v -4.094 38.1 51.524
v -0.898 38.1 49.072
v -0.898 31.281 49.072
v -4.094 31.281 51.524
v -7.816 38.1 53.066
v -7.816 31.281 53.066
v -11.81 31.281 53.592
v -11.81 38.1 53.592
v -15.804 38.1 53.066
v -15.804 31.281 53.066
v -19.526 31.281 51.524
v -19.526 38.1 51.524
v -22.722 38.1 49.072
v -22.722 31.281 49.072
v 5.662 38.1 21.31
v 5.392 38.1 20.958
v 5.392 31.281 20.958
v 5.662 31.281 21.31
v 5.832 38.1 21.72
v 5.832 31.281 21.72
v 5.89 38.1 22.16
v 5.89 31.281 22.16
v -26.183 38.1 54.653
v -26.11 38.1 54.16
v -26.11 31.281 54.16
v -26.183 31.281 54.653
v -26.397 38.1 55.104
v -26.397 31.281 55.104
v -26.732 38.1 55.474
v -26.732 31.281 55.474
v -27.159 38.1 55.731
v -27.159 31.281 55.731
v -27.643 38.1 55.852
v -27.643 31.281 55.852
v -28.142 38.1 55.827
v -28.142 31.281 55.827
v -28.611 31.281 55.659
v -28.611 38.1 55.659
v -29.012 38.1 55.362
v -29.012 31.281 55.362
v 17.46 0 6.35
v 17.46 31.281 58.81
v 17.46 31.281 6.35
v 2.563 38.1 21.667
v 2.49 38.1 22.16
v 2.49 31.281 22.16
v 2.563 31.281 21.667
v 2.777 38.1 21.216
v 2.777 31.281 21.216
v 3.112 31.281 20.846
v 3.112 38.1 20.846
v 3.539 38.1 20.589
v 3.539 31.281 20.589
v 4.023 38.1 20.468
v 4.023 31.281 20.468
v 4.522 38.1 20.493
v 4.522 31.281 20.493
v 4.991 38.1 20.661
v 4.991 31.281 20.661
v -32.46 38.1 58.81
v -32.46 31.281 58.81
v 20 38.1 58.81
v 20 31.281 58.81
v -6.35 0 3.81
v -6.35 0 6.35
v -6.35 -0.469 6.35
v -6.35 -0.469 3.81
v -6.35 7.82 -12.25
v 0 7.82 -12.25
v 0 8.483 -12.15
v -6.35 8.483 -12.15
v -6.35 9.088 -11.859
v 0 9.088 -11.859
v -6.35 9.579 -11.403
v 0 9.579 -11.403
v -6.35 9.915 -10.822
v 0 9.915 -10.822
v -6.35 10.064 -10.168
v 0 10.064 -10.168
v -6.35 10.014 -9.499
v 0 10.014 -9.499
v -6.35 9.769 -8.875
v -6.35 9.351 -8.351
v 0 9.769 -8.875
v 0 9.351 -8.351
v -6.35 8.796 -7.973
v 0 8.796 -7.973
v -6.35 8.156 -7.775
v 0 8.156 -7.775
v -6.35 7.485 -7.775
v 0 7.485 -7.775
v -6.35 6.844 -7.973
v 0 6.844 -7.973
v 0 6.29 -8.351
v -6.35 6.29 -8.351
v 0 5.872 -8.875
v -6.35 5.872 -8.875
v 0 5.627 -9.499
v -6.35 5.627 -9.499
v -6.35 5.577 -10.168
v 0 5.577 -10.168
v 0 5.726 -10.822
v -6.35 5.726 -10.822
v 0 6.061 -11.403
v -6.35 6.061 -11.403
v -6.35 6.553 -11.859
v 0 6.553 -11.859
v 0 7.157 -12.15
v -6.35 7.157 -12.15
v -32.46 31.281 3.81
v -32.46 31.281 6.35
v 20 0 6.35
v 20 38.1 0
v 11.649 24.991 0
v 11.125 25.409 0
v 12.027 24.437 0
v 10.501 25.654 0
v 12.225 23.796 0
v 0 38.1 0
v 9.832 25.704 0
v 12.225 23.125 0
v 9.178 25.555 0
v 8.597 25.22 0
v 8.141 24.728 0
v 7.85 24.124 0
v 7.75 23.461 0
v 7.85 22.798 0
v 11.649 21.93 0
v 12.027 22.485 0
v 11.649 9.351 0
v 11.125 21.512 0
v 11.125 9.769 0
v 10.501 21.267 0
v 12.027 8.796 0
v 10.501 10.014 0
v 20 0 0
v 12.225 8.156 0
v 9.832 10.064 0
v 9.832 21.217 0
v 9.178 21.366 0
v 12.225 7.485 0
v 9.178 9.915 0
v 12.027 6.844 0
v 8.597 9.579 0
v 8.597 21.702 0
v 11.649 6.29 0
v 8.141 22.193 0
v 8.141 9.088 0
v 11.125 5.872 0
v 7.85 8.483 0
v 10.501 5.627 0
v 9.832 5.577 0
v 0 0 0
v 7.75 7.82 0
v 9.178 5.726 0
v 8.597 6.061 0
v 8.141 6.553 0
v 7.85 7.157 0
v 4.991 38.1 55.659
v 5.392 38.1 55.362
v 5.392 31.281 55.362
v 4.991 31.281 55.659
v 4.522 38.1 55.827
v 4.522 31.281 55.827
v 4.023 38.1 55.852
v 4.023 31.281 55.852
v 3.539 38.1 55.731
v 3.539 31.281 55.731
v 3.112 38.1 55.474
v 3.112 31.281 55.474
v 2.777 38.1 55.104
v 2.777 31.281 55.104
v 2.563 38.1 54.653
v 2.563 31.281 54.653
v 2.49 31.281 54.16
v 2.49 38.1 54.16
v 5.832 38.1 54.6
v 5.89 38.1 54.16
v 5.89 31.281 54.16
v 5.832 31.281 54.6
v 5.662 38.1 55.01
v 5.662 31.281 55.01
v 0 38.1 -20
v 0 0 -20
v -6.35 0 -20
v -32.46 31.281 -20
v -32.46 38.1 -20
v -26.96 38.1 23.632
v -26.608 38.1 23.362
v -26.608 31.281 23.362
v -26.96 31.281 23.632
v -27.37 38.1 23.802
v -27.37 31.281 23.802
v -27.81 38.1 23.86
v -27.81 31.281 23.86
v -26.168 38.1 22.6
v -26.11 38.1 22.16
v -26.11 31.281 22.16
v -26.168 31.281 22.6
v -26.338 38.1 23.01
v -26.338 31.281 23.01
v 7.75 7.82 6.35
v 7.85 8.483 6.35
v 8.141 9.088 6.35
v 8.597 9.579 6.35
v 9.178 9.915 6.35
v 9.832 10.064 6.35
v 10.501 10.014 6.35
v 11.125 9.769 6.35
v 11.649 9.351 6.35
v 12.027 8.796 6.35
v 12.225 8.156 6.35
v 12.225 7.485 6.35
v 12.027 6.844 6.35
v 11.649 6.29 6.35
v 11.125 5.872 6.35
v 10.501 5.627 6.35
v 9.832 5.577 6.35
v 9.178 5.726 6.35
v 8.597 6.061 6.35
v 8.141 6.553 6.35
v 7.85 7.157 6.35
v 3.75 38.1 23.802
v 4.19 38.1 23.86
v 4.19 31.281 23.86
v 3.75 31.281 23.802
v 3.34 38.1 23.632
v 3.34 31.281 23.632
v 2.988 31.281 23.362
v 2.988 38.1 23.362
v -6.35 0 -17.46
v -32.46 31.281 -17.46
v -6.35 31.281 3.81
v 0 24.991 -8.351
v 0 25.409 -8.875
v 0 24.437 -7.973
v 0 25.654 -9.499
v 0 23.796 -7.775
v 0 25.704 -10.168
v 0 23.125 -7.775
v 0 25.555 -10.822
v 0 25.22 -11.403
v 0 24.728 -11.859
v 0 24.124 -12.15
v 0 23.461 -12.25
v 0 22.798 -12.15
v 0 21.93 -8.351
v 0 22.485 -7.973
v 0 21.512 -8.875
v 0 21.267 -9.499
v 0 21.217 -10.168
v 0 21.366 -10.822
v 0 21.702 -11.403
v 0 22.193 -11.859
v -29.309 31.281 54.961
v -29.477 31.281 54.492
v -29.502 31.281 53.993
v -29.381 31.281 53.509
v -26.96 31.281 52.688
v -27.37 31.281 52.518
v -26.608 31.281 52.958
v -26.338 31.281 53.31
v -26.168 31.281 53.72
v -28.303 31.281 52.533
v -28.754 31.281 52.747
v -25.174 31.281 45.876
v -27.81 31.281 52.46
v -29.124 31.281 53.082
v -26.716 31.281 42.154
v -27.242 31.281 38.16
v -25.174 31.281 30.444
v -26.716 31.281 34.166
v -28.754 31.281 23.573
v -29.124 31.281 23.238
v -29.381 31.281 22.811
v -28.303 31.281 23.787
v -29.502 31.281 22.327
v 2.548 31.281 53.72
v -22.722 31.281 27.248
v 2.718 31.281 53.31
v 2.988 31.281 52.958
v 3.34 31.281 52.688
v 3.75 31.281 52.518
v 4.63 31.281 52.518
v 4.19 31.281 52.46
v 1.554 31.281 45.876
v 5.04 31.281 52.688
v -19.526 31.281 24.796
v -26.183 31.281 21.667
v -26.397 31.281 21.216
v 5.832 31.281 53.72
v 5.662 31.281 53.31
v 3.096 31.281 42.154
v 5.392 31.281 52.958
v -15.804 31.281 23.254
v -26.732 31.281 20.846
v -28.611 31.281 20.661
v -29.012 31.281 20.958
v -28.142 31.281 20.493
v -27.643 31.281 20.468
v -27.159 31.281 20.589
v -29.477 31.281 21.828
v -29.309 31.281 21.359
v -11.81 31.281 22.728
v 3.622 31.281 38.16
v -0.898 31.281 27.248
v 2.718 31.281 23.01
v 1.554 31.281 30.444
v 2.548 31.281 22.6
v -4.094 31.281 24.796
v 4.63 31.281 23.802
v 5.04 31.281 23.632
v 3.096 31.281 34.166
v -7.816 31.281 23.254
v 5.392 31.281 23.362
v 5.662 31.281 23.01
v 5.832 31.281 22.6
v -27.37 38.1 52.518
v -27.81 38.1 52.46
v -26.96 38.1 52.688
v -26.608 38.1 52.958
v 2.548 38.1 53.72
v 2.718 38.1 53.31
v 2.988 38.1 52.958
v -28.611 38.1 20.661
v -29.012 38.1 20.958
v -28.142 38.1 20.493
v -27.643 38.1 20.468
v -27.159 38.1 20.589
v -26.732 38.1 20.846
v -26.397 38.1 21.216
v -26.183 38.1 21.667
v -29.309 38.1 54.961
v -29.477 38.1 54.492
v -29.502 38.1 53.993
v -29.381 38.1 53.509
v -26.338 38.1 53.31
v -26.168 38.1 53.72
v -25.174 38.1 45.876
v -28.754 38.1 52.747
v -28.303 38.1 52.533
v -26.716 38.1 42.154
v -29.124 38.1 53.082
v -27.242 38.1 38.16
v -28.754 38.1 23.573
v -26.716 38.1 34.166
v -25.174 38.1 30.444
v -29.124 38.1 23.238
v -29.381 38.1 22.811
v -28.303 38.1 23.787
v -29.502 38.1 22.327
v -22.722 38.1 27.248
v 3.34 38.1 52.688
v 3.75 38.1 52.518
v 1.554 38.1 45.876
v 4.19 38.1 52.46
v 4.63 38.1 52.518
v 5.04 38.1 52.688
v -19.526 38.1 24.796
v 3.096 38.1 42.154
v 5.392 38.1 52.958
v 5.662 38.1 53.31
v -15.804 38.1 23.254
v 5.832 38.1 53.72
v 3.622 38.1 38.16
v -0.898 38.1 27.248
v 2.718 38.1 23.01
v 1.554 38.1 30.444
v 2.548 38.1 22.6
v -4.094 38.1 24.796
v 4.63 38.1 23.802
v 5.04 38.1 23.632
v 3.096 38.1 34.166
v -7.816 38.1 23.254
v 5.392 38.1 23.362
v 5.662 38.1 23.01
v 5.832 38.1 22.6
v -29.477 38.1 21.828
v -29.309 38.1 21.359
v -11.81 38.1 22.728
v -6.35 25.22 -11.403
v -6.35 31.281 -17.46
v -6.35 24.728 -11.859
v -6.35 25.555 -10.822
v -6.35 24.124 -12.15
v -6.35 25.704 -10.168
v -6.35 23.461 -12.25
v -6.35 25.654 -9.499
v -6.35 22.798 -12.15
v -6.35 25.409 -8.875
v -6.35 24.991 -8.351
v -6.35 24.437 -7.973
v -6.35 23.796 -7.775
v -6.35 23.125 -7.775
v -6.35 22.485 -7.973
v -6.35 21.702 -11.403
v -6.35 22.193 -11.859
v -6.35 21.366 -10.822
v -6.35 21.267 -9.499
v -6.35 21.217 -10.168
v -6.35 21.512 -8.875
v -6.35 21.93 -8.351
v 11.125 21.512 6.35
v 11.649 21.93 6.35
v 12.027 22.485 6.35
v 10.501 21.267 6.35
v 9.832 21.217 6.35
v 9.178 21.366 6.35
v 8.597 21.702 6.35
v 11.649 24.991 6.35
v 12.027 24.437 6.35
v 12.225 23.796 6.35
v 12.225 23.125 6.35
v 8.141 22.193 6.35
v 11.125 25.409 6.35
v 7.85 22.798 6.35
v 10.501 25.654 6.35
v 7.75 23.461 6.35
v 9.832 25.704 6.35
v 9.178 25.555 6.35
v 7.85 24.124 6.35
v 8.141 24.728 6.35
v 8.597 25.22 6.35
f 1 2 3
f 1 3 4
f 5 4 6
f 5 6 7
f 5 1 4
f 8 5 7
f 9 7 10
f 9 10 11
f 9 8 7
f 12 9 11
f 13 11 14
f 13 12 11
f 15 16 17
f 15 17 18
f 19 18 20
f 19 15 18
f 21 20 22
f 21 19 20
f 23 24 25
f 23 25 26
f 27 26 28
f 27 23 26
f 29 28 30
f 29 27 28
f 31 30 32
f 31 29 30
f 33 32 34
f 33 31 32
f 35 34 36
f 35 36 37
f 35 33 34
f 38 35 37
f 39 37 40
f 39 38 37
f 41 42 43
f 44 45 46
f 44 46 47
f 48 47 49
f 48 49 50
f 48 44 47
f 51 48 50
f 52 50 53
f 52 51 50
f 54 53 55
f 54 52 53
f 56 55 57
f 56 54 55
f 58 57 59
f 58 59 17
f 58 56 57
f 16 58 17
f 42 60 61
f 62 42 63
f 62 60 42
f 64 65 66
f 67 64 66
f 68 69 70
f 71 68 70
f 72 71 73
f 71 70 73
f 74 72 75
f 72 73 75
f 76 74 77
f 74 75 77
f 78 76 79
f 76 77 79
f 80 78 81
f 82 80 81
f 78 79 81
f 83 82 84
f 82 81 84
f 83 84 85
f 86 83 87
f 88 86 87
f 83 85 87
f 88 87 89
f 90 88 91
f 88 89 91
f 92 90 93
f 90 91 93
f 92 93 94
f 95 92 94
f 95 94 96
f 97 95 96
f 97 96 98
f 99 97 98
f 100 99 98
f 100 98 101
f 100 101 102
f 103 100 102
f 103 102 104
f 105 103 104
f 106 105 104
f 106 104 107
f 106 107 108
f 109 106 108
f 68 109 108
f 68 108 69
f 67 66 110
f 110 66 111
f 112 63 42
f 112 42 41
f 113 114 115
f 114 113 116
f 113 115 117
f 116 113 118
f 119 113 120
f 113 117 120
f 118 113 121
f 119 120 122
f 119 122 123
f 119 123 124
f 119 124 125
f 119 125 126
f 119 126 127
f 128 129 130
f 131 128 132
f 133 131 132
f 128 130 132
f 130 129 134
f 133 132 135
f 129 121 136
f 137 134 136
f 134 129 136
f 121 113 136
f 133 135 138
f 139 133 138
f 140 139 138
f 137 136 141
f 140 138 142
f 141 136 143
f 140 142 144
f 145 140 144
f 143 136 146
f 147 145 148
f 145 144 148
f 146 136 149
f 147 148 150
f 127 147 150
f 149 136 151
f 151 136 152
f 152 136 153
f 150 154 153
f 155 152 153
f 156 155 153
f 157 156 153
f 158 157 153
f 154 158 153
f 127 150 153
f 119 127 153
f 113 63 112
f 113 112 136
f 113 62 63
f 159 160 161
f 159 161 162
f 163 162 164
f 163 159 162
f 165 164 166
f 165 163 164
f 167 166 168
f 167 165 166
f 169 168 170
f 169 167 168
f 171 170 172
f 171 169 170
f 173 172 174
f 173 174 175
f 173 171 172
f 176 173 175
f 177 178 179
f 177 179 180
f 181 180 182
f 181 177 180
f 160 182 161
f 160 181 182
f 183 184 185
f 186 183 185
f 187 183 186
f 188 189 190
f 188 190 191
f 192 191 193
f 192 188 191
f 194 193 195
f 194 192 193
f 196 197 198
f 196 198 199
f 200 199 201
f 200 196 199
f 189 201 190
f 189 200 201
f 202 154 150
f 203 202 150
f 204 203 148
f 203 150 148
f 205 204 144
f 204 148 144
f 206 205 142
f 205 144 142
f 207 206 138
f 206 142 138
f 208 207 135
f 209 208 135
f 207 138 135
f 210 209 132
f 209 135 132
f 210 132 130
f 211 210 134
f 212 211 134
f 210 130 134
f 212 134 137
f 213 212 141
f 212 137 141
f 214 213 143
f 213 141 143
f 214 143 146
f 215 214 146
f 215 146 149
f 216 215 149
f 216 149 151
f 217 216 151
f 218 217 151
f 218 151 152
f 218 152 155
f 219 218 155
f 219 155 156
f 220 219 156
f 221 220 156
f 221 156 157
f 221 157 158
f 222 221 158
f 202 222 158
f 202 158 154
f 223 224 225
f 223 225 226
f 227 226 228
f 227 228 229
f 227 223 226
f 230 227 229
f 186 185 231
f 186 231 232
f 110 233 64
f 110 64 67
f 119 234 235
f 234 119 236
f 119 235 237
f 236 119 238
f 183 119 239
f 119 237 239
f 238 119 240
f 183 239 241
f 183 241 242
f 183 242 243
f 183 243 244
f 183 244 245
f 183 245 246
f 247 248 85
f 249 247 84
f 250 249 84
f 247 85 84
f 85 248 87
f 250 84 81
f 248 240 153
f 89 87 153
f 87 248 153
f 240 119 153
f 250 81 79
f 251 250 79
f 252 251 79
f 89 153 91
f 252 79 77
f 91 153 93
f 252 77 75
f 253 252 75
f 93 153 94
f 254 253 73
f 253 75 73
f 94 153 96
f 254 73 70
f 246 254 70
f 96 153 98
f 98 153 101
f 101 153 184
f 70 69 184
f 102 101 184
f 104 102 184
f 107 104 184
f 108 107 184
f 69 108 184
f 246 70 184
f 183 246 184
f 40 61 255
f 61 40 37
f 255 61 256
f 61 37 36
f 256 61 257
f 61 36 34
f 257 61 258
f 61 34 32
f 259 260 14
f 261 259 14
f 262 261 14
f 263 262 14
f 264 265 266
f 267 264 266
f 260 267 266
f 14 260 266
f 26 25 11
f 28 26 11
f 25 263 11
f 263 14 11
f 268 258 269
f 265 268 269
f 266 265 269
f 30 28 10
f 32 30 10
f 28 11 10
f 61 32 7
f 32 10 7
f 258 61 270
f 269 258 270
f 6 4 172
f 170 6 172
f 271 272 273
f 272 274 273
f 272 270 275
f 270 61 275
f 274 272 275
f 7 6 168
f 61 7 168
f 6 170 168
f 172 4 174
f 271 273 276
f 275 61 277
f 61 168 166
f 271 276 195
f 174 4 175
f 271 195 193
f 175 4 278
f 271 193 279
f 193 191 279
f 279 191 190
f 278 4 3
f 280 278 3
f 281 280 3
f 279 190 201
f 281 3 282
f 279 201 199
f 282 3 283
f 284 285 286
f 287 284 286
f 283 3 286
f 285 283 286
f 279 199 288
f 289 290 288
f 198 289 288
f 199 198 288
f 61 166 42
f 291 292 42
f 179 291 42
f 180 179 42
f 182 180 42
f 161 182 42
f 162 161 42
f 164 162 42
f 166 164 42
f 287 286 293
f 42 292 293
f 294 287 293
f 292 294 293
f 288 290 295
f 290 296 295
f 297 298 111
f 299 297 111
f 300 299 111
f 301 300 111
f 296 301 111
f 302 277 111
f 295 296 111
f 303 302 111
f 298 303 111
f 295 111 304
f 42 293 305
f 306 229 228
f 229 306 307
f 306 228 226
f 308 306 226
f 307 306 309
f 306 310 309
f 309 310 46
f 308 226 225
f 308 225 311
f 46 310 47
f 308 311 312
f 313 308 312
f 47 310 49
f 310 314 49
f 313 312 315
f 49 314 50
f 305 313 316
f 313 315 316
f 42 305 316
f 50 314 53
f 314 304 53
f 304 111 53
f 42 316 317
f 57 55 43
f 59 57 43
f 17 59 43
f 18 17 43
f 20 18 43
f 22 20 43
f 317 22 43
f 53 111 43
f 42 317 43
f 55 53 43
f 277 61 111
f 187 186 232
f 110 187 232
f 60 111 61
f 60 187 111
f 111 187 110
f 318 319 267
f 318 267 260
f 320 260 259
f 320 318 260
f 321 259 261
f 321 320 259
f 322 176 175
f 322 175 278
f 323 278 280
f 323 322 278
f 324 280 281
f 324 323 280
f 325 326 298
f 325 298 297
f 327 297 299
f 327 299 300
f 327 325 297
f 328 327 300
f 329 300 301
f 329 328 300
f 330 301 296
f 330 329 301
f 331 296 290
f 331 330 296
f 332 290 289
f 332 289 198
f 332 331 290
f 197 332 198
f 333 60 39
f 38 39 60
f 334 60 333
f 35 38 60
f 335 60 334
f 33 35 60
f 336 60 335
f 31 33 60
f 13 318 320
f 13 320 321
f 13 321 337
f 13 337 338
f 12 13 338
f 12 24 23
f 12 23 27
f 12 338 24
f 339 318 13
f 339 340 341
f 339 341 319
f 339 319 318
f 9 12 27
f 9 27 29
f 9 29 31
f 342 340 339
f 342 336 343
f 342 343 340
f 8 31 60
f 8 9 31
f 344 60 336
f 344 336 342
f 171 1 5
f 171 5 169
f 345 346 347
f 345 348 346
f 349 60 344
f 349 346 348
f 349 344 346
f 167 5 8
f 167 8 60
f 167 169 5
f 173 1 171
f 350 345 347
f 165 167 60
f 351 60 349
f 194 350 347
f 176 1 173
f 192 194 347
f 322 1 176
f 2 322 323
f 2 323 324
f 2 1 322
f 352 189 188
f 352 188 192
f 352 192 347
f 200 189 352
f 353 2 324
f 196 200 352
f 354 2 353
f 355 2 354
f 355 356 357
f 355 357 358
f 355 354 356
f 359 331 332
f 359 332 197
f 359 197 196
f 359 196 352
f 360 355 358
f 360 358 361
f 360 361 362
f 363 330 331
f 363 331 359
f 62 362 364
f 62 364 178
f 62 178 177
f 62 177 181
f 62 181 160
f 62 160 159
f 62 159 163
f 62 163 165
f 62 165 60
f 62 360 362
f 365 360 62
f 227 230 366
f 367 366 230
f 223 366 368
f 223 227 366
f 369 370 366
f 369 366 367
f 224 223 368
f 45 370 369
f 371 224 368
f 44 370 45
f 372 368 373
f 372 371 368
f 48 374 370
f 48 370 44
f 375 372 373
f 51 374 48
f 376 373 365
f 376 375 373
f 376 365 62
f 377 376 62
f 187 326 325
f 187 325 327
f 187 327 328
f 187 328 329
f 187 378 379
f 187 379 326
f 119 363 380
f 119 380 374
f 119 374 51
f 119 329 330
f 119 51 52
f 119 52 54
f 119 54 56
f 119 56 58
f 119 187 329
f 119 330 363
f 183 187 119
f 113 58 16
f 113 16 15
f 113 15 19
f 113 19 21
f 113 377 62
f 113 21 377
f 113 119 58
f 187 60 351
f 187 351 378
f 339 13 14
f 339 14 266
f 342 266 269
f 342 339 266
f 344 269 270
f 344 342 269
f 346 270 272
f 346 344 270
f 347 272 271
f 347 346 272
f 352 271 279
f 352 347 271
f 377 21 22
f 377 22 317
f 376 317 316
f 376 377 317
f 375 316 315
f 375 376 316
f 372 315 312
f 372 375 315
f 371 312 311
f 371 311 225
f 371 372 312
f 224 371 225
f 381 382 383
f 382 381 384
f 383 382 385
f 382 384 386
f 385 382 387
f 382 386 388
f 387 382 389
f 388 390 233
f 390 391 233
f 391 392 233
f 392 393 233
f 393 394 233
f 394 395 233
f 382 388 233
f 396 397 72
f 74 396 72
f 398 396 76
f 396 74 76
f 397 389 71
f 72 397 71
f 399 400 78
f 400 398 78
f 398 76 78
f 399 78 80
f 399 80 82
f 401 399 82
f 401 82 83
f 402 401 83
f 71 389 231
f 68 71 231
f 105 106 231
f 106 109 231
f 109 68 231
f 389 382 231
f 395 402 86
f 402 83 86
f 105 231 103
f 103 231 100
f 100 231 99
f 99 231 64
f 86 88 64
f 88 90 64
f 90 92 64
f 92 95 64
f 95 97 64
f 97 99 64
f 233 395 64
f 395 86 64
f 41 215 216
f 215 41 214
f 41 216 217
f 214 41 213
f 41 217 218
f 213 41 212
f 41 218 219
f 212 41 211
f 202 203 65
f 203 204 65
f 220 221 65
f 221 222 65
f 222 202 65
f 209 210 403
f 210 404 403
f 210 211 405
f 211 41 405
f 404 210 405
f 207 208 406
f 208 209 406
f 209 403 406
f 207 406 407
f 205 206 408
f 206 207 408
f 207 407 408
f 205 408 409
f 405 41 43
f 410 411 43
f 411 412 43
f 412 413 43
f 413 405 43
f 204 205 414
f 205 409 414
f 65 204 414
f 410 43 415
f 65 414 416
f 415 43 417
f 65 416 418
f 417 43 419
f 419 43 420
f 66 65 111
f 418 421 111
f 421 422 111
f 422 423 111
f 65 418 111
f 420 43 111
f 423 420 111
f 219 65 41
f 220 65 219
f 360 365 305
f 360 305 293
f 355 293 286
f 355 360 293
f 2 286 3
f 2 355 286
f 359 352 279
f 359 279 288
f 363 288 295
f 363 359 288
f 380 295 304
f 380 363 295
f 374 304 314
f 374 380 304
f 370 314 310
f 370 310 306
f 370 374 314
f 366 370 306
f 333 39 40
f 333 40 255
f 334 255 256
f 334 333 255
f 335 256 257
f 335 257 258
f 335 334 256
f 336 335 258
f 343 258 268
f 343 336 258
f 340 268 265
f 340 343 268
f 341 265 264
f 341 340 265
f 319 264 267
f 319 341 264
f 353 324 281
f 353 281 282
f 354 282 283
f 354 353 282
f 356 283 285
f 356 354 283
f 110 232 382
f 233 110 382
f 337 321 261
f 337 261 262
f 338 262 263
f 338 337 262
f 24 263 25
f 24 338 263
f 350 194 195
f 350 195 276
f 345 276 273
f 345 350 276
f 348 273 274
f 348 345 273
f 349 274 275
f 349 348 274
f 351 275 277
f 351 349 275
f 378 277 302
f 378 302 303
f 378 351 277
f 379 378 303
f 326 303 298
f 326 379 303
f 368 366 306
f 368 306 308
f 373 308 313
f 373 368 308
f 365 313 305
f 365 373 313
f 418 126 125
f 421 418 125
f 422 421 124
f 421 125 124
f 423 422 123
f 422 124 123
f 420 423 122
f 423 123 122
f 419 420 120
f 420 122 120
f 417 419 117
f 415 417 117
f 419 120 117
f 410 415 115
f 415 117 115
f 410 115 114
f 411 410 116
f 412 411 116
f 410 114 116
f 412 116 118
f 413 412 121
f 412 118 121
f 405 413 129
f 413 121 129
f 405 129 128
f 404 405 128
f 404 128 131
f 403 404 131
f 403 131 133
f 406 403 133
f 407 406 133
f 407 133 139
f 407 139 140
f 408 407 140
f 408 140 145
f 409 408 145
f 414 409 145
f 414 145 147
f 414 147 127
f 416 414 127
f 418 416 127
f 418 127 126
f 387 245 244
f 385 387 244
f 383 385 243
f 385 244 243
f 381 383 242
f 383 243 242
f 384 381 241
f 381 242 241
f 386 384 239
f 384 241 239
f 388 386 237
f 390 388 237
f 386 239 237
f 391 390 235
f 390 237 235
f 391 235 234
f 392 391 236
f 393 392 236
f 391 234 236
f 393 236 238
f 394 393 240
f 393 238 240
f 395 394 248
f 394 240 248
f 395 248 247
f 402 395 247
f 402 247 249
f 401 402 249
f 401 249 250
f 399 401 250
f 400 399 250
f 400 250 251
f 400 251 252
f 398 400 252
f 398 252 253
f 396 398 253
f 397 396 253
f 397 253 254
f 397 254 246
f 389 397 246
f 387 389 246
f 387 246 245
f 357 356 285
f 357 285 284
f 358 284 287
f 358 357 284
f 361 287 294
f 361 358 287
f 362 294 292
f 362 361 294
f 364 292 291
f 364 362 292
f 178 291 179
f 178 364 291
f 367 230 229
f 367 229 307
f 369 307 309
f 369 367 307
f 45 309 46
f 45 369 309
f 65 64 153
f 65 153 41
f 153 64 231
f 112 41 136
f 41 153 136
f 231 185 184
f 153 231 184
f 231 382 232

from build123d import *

# Parameters (mm, degrees)
SKETCH1_W            = 20
SKETCH1_H            = 6.35
SKETCH1_W_2          = 6.35
SKETCH1_H_2          = 20
BOSS_EXTRUDE1_DEPTH  = 38.1
SKETCH2_W            = 26.11
SKETCH2_H            = 26.35
BOSS_EXTRUDE2_DEPTH  = 6.81899017
BOSS_EXTRUDE3_DEPTH  = 2.54
BOSS_EXTRUDE4_DEPTH  = 2.54
BOSS_EXTRUDE5_DEPTH  = 2.54
M4_CLEARANCE_HOLE1_D = 4.5
M4_CLEARANCE_HOLE2_D = 4.5


with BuildPart() as part:
    # Sketch1 → Boss-Extrude1 (new body)
    with BuildSketch(Plane(origin=(0, 0, 0), x_dir=(1, 0, 0), z_dir=(0, 1, 0))):
        with Locations((10, -3.175)):
            Rectangle(SKETCH1_W, SKETCH1_H)
        with Locations((-3.175, -3.175)):
            Rectangle(SKETCH1_W_2, SKETCH1_H)
        with Locations((-3.175, 10)):
            Rectangle(SKETCH1_W_2, SKETCH1_H_2)
    extrude(amount=BOSS_EXTRUDE1_DEPTH)

    # Sketch2 → Boss-Extrude2 (add)
    with BuildSketch(Plane(origin=(0, 38.1, 0), x_dir=(1, 0, 0), z_dir=(0, 1, 0))):
        with BuildLine():
            Line((-32.46, -58.81), (8.84, -58.81))
            Line((8.84, -58.81), (5.392081528, -55.362081528))
            ThreePointArc((5.392081528, -55.362081528), (3.539438165, -55.730595205), (2.49, -54.16))
            Line((2.49, -54.16), (-26.11, -54.16))
            ThreePointArc((-26.11, -54.16), (-27.159438165, -55.730595205), (-29.012081528, -55.362081528))
            Line((-29.012081528, -55.362081528), (-32.46, -58.81))
        make_face()
        with BuildLine():
            Line((5.392081528, -55.362081528), (8.84, -58.81))
            Line((8.84, -58.81), (8.84, -17.51))
            Line((8.84, -17.51), (5.392081528, -20.957918472))
            ThreePointArc((5.392081528, -20.957918472), (5.760595205, -21.509438165), (5.89, -22.16))
            ThreePointArc((5.89, -22.16), (5.392081528, -23.362081528), (4.19, -23.86))
            Line((4.19, -23.86), (4.19, -52.46))
            ThreePointArc((4.19, -52.46), (5.392081528, -52.957918472), (5.89, -54.16))
            ThreePointArc((5.89, -54.16), (5.760595205, -54.810561835), (5.392081528, -55.362081528))
        make_face()
        Polygon((20, -58.81), (20, -6.35), (-6.35, -6.35), (-32.46, -6.35), (-32.46, -17.51), (8.84, -17.51), (8.84, -58.81), align=None)
        with Locations((-19.405, 6.825)):
            Rectangle(SKETCH2_W, SKETCH2_H)
        with BuildLine():
            Line((8.84, -17.51), (-32.46, -17.51))
            Line((-32.46, -17.51), (-29.012081528, -20.957918472))
            ThreePointArc((-29.012081528, -20.957918472), (-27.159438165, -20.589404795), (-26.11, -22.16))
            Line((-26.11, -22.16), (2.49, -22.16))
            ThreePointArc((2.49, -22.16), (3.539438165, -20.589404795), (5.392081528, -20.957918472))
            Line((5.392081528, -20.957918472), (8.84, -17.51))
        make_face()
        with BuildLine():
            Line((-29.012081528, -20.957918472), (-32.46, -17.51))
            Line((-32.46, -17.51), (-32.46, -58.81))
            Line((-32.46, -58.81), (-29.012081528, -55.362081528))
            ThreePointArc((-29.012081528, -55.362081528), (-29.380595205, -53.509438165), (-27.81, -52.46))
            Line((-27.81, -52.46), (-27.81, -23.86))
            ThreePointArc((-27.81, -23.86), (-29.380595205, -22.810561835), (-29.012081528, -20.957918472))
        make_face()
        with BuildLine():
            ThreePointArc((-26.607918472, -23.362081528), (-27.159438165, -23.730595205), (-27.81, -23.86))
            Line((-27.81, -23.86), (-27.81, -52.46))
            ThreePointArc((-27.81, -52.46), (-27.159438165, -52.589404795), (-26.607918472, -52.957918472))
            Line((-26.607918472, -52.957918472), (-22.7220672, -49.0720672))
            ThreePointArc((-22.7220672, -49.0720672), (-27.241993428, -38.16), (-22.7220672, -27.2479328))
            Line((-22.7220672, -27.2479328), (-26.607918472, -23.362081528))
        make_face()
        with BuildLine():
            Line((2.49, -22.16), (-26.11, -22.16))
            ThreePointArc((-26.11, -22.16), (-26.239404795, -22.810561835), (-26.607918472, -23.362081528))
            Line((-26.607918472, -23.362081528), (-22.7220672, -27.2479328))
            ThreePointArc((-22.7220672, -27.2479328), (-11.81, -22.728006572), (-0.8979328, -27.2479328))
            Line((-0.8979328, -27.2479328), (2.987918472, -23.362081528))
            ThreePointArc((2.987918472, -23.362081528), (2.619404795, -22.810561835), (2.49, -22.16))
        make_face()
        with BuildLine():
            Line((-0.8979328, -49.0720672), (2.987918472, -52.957918472))
            ThreePointArc((2.987918472, -52.957918472), (3.539438165, -52.589404795), (4.19, -52.46))
            Line((4.19, -52.46), (4.19, -23.86))
            ThreePointArc((4.19, -23.86), (3.539438165, -23.730595205), (2.987918472, -23.362081528))
            Line((2.987918472, -23.362081528), (-0.8979328, -27.2479328))
            ThreePointArc((-0.8979328, -27.2479328), (2.447302874, -32.254431787), (3.621993428, -38.16))
            ThreePointArc((3.621993428, -38.16), (2.447302874, -44.065568213), (-0.8979328, -49.0720672))
        make_face()
        with BuildLine():
            Line((-26.11, -54.16), (2.49, -54.16))
            ThreePointArc((2.49, -54.16), (2.619404795, -53.509438165), (2.987918472, -52.957918472))
            Line((2.987918472, -52.957918472), (-0.8979328, -49.0720672))
            ThreePointArc((-0.8979328, -49.0720672), (-11.81, -53.591993428), (-22.7220672, -49.0720672))
            Line((-22.7220672, -49.0720672), (-26.607918472, -52.957918472))
            ThreePointArc((-26.607918472, -52.957918472), (-26.239404795, -53.509438165), (-26.11, -54.16))
        make_face()
    extrude(amount=-BOSS_EXTRUDE2_DEPTH)

    # Sketch3 → Boss-Extrude3 (add)
    with BuildSketch(Plane(origin=(20, 0, 0), x_dir=(0, 0, -1), z_dir=(1, 0, 0))):
        Polygon((-58.81, 31.28100983), (-6.35, 0), (-6.35, 31.28100983), align=None)
    extrude(amount=-BOSS_EXTRUDE3_DEPTH)

    # Sketch4 → Boss-Extrude4 (add)
    with BuildSketch(Plane(origin=(0, 0, -20), x_dir=(-1, 0, 0), z_dir=(0, 0, -1))):
        Polygon((6.35, 0), (32.46, 31.28100983), (6.35, 31.28100983), align=None)
    extrude(amount=-BOSS_EXTRUDE4_DEPTH)

    # Sketch5 → Boss-Extrude5 (add)
    with BuildSketch(Plane.XY.offset(6.35)):
        Polygon((-6.35, -0.46899017), (-32.46, 31.28100983), (-6.35, 31.28100983), align=None)
    extrude(amount=-BOSS_EXTRUDE5_DEPTH)

    # M4 Clearance Hole1 (through all)
    with Locations(Plane.ZY.offset(6.35)):
        with Locations((-10, 23.460757372), (-10, 7.820252457)):
            Hole(M4_CLEARANCE_HOLE1_D / 2)

    # M4 Clearance Hole2 (through all)
    with Locations(Plane.XY.offset(6.35)):
        with Locations((10, 7.820252457), (10, 23.460757372)):
            Hole(M4_CLEARANCE_HOLE2_D / 2)


solid = part.part
